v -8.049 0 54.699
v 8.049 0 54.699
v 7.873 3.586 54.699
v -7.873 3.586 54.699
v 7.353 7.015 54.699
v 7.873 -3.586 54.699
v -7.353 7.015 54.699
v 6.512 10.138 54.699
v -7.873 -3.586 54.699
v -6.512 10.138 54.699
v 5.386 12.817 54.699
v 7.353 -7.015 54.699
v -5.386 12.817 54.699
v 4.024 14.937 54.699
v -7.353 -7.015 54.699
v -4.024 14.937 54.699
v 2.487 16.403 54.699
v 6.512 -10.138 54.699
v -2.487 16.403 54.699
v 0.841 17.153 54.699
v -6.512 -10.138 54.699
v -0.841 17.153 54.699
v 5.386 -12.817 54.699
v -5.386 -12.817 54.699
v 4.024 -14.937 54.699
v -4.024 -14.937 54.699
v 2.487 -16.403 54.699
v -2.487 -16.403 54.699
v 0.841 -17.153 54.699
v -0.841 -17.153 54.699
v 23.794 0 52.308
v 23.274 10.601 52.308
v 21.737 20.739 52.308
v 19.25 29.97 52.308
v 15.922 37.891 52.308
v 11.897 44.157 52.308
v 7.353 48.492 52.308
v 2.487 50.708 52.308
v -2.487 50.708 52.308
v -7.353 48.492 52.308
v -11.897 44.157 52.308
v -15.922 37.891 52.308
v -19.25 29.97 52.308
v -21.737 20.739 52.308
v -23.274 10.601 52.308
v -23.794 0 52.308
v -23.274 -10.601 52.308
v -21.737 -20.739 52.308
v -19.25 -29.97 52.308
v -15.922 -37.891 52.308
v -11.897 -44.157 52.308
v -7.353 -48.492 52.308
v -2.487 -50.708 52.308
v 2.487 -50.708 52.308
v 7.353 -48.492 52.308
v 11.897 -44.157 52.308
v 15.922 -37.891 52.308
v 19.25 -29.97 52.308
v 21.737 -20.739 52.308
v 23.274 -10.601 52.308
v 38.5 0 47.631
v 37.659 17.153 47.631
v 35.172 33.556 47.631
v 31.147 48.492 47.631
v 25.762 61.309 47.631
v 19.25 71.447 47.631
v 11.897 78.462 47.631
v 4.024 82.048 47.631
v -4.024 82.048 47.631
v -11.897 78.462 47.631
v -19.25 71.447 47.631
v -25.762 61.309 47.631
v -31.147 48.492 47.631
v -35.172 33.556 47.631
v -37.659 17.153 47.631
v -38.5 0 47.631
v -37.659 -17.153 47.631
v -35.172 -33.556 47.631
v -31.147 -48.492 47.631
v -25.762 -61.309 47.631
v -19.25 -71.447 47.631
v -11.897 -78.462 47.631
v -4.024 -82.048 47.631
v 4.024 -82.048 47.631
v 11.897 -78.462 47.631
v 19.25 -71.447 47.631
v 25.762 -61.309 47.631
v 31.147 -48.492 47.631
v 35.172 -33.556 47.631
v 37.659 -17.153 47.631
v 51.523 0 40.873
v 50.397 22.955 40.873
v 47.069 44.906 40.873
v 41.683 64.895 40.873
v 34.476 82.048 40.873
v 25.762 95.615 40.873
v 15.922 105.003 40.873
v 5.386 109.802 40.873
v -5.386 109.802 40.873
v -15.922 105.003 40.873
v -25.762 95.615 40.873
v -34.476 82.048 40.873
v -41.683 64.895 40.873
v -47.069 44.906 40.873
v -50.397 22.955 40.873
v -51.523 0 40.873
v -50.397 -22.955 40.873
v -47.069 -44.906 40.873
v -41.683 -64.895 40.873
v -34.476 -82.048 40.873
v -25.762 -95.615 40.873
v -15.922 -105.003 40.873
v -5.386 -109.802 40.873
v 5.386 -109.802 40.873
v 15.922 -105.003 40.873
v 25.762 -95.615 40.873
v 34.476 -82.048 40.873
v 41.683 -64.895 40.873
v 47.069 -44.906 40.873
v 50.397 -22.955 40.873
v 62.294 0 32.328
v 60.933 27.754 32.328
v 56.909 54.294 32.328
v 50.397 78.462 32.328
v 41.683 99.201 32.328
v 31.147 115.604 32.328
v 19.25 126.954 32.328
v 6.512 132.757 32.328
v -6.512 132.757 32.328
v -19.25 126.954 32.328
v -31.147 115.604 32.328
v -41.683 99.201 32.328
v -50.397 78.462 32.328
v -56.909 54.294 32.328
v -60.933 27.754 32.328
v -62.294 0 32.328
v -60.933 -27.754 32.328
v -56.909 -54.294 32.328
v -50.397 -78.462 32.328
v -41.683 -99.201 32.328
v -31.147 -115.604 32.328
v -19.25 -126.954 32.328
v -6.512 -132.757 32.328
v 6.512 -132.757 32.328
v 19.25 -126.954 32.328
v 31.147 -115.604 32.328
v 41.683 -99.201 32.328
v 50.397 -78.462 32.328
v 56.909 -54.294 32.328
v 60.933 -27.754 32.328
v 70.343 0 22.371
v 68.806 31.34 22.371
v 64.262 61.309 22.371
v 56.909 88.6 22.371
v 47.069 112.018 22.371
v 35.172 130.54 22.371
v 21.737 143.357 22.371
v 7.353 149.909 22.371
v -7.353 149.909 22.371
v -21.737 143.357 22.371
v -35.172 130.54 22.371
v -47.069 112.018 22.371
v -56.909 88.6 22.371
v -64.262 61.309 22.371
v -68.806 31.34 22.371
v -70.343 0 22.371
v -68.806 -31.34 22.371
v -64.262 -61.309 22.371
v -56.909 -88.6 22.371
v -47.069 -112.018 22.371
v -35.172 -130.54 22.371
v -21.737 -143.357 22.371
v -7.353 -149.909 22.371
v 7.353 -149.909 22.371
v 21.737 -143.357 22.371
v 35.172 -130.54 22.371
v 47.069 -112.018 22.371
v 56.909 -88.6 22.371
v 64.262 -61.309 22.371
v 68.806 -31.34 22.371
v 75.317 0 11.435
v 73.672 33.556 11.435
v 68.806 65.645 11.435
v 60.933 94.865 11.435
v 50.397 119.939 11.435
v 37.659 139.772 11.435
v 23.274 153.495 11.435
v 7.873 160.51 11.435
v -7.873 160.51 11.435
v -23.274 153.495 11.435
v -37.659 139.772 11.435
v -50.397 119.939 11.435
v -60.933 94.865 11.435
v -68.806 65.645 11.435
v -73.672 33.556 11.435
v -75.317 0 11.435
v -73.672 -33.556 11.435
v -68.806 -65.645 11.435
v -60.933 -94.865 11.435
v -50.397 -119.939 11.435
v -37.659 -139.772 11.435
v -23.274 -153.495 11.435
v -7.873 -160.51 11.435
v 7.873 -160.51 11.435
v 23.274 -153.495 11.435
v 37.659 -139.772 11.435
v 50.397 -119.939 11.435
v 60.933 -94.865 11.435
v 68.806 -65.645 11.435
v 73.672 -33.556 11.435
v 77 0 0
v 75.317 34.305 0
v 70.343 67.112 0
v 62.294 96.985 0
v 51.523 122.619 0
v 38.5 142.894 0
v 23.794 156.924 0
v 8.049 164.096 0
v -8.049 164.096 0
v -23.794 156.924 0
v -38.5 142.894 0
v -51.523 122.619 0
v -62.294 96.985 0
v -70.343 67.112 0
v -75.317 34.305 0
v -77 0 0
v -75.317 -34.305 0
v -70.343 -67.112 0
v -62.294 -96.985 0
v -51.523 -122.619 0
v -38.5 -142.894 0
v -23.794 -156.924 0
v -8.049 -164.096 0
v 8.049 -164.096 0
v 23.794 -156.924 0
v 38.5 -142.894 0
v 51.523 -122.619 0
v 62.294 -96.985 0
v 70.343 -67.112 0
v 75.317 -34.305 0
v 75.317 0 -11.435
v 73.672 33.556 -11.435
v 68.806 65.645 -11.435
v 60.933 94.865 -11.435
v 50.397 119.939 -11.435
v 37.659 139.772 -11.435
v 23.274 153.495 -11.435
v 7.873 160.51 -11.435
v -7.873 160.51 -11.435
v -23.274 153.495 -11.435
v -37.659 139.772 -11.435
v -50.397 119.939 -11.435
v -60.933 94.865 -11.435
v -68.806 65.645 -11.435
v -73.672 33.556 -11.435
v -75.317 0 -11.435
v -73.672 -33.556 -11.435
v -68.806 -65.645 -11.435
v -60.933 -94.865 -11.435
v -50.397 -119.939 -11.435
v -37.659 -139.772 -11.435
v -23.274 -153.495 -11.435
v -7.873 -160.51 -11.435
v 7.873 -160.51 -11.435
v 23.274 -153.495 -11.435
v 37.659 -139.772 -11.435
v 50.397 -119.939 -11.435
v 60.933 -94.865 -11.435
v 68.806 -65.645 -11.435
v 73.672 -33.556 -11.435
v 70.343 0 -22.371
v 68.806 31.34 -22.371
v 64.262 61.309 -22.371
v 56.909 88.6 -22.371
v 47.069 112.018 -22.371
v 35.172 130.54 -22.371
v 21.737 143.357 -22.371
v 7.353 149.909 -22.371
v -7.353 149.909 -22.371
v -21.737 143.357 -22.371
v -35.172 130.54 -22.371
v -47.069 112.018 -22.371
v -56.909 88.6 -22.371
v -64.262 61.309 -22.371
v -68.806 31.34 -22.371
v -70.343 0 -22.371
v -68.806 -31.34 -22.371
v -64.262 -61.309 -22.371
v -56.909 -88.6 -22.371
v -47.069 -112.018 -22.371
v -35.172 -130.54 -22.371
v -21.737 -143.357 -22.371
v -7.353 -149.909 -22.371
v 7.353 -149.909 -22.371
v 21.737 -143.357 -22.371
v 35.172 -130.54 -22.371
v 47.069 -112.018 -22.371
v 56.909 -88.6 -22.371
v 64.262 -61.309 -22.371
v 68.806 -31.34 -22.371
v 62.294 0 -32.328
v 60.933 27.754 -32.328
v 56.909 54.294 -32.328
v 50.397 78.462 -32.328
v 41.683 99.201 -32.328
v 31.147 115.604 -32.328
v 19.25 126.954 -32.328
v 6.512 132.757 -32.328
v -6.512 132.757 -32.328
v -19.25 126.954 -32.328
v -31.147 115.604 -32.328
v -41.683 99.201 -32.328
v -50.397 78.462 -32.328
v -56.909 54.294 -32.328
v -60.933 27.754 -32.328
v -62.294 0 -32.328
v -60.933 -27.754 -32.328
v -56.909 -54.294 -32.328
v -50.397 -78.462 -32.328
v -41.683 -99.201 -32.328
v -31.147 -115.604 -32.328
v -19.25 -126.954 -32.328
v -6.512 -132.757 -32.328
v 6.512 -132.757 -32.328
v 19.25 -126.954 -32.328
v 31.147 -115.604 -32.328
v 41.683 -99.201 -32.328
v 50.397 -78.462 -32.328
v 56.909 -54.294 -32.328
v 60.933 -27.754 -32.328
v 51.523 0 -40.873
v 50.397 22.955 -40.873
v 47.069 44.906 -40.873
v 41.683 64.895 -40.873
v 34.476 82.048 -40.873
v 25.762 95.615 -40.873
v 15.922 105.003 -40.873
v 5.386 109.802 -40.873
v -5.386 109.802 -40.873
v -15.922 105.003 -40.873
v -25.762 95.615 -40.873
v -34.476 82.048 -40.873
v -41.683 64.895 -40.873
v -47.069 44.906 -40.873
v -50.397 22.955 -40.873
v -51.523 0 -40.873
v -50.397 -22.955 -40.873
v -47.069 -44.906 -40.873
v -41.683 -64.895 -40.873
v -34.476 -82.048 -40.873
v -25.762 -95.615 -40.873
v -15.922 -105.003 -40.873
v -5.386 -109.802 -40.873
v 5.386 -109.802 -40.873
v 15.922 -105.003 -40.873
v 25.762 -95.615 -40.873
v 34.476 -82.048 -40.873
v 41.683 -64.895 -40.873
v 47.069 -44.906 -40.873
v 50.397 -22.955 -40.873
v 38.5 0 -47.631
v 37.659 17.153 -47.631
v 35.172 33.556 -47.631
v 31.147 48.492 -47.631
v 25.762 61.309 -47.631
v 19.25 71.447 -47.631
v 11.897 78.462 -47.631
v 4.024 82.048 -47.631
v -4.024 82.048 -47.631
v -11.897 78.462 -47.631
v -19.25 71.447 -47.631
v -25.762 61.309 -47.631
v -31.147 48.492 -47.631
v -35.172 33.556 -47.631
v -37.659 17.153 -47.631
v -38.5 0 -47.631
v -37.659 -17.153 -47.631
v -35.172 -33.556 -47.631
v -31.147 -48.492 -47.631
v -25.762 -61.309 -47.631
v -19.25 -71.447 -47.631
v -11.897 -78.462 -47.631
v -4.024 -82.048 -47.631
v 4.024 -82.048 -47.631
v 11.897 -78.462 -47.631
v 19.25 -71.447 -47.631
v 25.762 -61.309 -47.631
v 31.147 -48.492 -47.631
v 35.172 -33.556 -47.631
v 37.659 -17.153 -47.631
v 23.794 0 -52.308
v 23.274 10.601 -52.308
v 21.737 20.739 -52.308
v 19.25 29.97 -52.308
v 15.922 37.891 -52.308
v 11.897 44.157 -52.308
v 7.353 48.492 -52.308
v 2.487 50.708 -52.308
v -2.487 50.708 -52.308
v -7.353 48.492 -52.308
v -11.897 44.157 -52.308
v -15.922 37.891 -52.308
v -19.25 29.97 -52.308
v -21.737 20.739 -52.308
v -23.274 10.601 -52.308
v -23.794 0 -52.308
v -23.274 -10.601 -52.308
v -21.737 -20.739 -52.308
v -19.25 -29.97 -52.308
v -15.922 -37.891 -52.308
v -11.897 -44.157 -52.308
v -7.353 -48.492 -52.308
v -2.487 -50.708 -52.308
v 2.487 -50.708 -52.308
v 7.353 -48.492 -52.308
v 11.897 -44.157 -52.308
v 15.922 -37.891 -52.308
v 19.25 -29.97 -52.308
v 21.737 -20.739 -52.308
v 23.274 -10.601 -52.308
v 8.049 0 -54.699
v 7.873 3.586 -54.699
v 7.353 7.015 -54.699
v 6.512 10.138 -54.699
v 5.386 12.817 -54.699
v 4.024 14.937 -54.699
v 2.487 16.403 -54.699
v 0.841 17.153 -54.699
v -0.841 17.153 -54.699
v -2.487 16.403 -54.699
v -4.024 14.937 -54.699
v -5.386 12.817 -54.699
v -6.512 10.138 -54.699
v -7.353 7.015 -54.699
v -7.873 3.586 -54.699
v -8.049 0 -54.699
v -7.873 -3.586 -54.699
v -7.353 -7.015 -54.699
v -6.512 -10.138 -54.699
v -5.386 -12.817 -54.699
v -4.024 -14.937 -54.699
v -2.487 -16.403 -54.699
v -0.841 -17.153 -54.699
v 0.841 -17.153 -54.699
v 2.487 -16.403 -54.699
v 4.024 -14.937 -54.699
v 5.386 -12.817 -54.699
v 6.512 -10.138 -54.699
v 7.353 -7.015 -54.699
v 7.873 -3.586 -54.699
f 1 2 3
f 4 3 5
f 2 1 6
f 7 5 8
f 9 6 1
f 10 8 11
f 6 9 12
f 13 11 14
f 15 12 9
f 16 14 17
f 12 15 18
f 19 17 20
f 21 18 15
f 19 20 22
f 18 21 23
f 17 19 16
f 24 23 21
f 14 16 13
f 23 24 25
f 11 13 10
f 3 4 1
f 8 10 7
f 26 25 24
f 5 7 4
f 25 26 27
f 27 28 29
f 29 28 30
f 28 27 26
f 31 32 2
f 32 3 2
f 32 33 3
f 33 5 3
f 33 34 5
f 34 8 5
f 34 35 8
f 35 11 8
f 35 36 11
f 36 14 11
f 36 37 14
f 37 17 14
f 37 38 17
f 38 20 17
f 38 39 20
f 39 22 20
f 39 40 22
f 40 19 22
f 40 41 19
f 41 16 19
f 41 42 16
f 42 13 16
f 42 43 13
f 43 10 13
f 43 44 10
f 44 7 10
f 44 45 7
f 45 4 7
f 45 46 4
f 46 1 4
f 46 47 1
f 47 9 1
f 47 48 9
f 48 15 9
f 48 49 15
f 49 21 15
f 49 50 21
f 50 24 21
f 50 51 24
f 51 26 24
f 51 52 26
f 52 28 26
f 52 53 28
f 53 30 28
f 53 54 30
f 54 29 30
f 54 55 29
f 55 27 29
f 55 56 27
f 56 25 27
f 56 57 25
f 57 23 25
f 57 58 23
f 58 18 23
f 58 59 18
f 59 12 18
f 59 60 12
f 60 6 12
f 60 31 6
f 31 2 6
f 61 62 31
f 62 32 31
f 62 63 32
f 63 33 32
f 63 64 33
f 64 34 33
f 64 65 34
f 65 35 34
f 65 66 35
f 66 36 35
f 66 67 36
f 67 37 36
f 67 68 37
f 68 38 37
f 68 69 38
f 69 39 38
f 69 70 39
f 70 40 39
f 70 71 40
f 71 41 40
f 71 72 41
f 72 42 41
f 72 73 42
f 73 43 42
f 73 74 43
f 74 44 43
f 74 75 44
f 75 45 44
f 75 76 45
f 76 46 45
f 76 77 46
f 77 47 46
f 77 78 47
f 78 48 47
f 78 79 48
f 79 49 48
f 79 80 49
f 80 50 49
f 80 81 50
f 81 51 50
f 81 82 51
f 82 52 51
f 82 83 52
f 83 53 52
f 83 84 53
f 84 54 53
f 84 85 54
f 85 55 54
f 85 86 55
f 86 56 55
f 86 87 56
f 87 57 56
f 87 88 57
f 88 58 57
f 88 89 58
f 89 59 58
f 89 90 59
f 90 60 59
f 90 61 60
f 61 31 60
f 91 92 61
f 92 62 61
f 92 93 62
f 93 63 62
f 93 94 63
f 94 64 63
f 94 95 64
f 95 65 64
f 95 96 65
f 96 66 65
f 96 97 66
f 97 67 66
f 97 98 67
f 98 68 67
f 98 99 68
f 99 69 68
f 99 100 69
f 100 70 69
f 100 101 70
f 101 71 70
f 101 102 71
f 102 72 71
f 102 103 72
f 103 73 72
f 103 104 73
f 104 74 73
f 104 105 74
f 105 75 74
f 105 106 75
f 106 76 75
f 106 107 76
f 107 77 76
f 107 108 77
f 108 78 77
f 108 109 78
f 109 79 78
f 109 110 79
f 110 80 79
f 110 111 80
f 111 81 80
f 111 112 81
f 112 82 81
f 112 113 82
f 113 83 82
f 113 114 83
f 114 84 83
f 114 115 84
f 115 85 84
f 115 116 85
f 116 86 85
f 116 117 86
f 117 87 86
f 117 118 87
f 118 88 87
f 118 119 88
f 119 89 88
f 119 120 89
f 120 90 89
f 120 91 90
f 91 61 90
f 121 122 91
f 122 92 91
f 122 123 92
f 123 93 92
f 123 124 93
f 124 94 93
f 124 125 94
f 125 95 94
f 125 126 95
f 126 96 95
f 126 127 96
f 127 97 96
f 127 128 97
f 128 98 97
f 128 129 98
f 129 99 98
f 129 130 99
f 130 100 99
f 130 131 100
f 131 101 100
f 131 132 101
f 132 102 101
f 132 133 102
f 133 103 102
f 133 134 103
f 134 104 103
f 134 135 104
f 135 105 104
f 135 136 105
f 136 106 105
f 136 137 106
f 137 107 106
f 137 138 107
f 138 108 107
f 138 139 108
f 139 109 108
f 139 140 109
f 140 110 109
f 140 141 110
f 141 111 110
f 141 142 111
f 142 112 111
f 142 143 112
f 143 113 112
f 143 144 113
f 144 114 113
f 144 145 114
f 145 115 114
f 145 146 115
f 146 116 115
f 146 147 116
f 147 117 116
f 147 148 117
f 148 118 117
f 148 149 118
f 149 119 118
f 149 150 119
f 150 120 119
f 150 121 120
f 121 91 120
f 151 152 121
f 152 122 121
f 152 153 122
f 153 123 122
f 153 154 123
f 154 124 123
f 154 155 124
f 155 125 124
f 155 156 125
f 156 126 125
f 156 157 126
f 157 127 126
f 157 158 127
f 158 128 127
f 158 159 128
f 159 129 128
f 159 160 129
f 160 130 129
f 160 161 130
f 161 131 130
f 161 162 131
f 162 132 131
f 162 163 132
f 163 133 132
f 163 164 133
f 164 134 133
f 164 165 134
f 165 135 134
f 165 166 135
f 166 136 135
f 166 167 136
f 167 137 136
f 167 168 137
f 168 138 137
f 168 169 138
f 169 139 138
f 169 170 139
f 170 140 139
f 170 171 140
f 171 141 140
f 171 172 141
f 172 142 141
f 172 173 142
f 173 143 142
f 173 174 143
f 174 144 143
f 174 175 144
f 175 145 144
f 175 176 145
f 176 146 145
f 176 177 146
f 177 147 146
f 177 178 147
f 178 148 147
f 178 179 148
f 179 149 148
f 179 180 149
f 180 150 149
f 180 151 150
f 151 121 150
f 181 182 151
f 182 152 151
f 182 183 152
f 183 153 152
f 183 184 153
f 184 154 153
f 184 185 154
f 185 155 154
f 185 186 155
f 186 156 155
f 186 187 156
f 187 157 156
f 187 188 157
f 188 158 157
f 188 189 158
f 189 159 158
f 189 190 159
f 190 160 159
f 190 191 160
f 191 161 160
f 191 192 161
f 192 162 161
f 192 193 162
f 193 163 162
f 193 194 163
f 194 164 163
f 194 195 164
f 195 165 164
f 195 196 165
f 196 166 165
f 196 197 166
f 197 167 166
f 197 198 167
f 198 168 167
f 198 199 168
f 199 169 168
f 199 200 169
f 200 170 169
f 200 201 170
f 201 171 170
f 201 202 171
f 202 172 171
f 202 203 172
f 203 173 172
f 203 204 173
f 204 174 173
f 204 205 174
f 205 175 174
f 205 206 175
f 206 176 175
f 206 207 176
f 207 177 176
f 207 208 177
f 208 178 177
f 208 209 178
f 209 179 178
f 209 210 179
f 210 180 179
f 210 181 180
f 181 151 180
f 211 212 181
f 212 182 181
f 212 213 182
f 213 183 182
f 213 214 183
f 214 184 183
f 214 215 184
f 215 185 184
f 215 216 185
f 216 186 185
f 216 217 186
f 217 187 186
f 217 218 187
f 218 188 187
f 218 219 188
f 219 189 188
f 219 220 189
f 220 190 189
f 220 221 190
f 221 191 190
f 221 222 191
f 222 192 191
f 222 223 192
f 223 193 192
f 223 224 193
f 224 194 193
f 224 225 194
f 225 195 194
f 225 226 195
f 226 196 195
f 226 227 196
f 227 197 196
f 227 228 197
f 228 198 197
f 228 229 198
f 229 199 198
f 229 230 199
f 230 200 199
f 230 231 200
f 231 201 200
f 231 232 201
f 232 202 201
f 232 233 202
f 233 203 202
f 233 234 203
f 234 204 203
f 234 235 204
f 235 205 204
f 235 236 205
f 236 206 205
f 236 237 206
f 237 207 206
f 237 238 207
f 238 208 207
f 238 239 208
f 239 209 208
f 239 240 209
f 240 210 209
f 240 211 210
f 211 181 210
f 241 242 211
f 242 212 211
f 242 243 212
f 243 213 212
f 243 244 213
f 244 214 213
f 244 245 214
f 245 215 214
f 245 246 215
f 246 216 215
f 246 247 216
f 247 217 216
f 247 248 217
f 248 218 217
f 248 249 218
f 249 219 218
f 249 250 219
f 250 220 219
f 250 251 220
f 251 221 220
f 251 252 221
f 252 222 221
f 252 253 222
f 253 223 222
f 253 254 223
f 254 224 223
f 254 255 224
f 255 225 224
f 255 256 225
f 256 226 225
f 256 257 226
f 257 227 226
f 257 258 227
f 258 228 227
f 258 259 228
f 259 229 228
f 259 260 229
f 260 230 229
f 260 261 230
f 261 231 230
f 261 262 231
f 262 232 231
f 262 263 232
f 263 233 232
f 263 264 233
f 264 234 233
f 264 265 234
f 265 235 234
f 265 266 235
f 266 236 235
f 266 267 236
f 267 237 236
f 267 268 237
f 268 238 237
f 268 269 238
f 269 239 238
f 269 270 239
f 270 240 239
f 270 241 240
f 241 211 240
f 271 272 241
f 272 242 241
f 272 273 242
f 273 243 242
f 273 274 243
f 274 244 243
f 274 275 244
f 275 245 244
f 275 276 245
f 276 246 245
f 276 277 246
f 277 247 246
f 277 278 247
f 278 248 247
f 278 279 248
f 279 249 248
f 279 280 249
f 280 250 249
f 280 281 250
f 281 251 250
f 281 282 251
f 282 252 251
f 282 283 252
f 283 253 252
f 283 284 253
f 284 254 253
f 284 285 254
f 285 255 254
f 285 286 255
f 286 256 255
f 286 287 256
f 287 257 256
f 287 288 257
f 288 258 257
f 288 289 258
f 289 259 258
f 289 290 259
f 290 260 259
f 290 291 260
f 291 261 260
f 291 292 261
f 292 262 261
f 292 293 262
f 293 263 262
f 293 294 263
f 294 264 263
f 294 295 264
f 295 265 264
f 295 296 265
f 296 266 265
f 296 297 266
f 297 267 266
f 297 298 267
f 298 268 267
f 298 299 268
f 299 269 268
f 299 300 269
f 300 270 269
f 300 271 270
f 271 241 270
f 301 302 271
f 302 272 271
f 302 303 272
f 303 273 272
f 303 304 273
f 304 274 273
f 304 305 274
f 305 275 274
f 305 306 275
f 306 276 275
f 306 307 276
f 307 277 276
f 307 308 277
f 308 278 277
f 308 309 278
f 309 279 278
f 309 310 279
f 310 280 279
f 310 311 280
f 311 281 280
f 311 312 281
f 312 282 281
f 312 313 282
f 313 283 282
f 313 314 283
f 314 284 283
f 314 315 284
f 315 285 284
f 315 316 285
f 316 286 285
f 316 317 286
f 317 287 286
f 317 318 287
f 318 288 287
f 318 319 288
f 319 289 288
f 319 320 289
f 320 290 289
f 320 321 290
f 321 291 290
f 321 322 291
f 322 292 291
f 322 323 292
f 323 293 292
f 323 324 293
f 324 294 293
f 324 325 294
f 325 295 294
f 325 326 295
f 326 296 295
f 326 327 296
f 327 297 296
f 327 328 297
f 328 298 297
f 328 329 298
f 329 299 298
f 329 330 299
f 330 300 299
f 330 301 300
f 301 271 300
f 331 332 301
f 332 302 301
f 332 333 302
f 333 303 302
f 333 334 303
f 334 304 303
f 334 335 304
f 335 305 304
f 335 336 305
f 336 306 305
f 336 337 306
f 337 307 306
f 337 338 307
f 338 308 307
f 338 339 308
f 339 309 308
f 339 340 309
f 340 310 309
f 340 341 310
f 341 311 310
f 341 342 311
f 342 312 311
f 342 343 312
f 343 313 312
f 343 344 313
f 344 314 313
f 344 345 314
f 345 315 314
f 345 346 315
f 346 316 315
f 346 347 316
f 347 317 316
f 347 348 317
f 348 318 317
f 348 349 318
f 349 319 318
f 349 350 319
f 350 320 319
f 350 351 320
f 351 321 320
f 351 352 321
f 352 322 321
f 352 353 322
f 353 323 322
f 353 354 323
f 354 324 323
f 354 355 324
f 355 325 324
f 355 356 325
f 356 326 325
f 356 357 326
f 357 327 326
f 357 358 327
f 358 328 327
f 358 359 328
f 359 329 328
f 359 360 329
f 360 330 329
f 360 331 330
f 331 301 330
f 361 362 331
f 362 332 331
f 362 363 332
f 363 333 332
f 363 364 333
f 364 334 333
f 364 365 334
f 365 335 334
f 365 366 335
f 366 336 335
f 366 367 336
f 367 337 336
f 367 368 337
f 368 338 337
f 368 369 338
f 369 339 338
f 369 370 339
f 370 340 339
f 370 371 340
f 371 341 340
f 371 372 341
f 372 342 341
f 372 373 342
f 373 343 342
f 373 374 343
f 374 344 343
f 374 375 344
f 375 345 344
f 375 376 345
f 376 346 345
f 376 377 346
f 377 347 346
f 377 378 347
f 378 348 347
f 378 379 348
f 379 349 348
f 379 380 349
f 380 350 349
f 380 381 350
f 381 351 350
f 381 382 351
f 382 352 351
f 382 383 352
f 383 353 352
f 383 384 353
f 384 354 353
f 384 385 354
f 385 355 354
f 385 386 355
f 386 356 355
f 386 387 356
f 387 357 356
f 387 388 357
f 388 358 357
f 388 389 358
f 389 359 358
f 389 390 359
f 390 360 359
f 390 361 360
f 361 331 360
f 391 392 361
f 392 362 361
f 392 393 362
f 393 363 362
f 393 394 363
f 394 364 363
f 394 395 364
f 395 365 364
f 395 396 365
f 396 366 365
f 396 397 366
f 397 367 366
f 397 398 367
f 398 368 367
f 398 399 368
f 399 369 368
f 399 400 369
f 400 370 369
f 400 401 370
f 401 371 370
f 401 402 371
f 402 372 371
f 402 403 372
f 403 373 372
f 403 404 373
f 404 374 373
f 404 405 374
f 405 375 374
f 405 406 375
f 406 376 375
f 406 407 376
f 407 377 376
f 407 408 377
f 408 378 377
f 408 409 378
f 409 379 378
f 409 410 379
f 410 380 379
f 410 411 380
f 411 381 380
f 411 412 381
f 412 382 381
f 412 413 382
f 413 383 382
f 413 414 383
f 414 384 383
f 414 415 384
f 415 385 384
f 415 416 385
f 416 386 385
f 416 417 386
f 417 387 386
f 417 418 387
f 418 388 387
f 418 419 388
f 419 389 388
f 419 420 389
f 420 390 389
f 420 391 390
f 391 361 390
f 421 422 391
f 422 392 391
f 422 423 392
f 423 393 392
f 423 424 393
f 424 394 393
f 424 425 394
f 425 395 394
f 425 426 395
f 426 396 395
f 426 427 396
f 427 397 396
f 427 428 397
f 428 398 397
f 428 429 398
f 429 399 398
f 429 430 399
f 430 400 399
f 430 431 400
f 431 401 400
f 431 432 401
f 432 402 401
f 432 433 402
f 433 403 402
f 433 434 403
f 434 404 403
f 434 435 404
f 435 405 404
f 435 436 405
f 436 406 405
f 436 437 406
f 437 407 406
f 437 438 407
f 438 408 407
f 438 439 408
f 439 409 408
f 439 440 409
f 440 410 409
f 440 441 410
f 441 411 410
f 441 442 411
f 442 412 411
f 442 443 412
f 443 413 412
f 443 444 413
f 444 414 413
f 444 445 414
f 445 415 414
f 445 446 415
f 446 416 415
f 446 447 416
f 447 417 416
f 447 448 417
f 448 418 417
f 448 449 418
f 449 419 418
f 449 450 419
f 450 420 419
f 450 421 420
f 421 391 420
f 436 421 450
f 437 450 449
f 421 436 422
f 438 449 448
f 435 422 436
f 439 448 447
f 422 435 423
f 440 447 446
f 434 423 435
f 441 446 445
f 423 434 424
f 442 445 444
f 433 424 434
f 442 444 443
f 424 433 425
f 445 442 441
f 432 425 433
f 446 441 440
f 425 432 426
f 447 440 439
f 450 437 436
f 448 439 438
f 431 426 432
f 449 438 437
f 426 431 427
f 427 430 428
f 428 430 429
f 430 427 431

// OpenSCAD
// Generated by SolidPython 1.0.1 on 2020-07-29 00:46:48


scale(v = [7, 15, 5]) {
	sphere(r = 11);
}
/***********************************************
*********      SolidPython code:      **********
************************************************
 
# import packages: SolidPython
from solid import *
from solid.utils import *
from itertools import chain, combinations, permutations


class Resize:

    def __init__(self, scad_file):
        self.scad_file = scad_file
        #self.scad_file = import_scad(scad_file)
        # cone/cylinder param:
        self.r1 = 0
        self.r2 = 0
        self.h = 0
        # rectangular prism param:
        self.w = 0
        self.l = 0
        # ellipse param:
        self.r = 0

    # import OpenScad code (file name corresponds to shape)


    # classify shape + parameters
    def assign(self, param1, param2, param3):
        if self.scad_file == 'cone.scad':
            self.r1 = param1
            self.r2 = param2
            self.h = param3
        elif self.scad_file == 'cylinder.scad':
            self.r1 = param1
            self.r2 = param2
            self.h = param3
        elif self.scad_file == 'rectangularPrism.scad':
            self.h = param1
            self.l = param2
            self.w = param3
        else:
            self.r = param1
            self.h = param2

    # resize parameters
    def iterate(self):
        x = range(3, 20, 2)
        i = 1
        if self.scad_file == 'cone.scad':
            tempList = list(permutations(x, 2))
            for temp in tempList:
                param1 = temp[0]
                param2 = temp[1]
                filepath = 'produced_scad_files/' + 'cone' + str(param1) + '_' + str(param2) + '_' + '.scad'
                scad_render_to_file(cylinder(h=param1, r1=param2, r2=0), filepath)

        elif self.scad_file == 'cylinder.scad':
            tempList = list(permutations(x, 3))
            for temp in tempList:
                param1 = temp[0]
                param2 = temp[1]
                filepath = 'produced_scad_files/' + 'cylinder' + str(param1) + '_' + str(param2) + '_' + '.scad'
                scad_render_to_file(cylinder(h=param1, r1=param2, r2=param2), filepath)

        elif self.scad_file == 'rectangularPrism.scad':
            tempList = list(permutations(x, 3))
            for temp in tempList:
                param1 = temp[0]
                param2 = temp[1]
                param3 = temp[2]
                filepath = 'produced_scad_files/' + 'rectangularPrism' + str(param1) + '_' + str(param2) + '_' + str(
                    param3) + '.scad'
                scad_render_to_file(cube(size=(param1, param2, param3)), filepath)

        elif self.scad_file == 'ellipse.scad':
            tempList = list(permutations(x, 4))
            for temp in tempList:
                param1 = temp[0]
                param2 = temp[1]
                param3 = temp[2]
                param4 = temp[3]
                filepath = 'produced_scad_files/' + 'ellipse' + str(param1) + '_' + str(param2) + '_' + str(param3) + '_' + str(param4) + '.scad'
                scad_render_to_file(scale([param1, param2, param3])(sphere(r=param4)), filepath)

    def render_to_scadfile(self):
        scad_render_to_file(scad, 'example.scad') 
 
************************************************/
